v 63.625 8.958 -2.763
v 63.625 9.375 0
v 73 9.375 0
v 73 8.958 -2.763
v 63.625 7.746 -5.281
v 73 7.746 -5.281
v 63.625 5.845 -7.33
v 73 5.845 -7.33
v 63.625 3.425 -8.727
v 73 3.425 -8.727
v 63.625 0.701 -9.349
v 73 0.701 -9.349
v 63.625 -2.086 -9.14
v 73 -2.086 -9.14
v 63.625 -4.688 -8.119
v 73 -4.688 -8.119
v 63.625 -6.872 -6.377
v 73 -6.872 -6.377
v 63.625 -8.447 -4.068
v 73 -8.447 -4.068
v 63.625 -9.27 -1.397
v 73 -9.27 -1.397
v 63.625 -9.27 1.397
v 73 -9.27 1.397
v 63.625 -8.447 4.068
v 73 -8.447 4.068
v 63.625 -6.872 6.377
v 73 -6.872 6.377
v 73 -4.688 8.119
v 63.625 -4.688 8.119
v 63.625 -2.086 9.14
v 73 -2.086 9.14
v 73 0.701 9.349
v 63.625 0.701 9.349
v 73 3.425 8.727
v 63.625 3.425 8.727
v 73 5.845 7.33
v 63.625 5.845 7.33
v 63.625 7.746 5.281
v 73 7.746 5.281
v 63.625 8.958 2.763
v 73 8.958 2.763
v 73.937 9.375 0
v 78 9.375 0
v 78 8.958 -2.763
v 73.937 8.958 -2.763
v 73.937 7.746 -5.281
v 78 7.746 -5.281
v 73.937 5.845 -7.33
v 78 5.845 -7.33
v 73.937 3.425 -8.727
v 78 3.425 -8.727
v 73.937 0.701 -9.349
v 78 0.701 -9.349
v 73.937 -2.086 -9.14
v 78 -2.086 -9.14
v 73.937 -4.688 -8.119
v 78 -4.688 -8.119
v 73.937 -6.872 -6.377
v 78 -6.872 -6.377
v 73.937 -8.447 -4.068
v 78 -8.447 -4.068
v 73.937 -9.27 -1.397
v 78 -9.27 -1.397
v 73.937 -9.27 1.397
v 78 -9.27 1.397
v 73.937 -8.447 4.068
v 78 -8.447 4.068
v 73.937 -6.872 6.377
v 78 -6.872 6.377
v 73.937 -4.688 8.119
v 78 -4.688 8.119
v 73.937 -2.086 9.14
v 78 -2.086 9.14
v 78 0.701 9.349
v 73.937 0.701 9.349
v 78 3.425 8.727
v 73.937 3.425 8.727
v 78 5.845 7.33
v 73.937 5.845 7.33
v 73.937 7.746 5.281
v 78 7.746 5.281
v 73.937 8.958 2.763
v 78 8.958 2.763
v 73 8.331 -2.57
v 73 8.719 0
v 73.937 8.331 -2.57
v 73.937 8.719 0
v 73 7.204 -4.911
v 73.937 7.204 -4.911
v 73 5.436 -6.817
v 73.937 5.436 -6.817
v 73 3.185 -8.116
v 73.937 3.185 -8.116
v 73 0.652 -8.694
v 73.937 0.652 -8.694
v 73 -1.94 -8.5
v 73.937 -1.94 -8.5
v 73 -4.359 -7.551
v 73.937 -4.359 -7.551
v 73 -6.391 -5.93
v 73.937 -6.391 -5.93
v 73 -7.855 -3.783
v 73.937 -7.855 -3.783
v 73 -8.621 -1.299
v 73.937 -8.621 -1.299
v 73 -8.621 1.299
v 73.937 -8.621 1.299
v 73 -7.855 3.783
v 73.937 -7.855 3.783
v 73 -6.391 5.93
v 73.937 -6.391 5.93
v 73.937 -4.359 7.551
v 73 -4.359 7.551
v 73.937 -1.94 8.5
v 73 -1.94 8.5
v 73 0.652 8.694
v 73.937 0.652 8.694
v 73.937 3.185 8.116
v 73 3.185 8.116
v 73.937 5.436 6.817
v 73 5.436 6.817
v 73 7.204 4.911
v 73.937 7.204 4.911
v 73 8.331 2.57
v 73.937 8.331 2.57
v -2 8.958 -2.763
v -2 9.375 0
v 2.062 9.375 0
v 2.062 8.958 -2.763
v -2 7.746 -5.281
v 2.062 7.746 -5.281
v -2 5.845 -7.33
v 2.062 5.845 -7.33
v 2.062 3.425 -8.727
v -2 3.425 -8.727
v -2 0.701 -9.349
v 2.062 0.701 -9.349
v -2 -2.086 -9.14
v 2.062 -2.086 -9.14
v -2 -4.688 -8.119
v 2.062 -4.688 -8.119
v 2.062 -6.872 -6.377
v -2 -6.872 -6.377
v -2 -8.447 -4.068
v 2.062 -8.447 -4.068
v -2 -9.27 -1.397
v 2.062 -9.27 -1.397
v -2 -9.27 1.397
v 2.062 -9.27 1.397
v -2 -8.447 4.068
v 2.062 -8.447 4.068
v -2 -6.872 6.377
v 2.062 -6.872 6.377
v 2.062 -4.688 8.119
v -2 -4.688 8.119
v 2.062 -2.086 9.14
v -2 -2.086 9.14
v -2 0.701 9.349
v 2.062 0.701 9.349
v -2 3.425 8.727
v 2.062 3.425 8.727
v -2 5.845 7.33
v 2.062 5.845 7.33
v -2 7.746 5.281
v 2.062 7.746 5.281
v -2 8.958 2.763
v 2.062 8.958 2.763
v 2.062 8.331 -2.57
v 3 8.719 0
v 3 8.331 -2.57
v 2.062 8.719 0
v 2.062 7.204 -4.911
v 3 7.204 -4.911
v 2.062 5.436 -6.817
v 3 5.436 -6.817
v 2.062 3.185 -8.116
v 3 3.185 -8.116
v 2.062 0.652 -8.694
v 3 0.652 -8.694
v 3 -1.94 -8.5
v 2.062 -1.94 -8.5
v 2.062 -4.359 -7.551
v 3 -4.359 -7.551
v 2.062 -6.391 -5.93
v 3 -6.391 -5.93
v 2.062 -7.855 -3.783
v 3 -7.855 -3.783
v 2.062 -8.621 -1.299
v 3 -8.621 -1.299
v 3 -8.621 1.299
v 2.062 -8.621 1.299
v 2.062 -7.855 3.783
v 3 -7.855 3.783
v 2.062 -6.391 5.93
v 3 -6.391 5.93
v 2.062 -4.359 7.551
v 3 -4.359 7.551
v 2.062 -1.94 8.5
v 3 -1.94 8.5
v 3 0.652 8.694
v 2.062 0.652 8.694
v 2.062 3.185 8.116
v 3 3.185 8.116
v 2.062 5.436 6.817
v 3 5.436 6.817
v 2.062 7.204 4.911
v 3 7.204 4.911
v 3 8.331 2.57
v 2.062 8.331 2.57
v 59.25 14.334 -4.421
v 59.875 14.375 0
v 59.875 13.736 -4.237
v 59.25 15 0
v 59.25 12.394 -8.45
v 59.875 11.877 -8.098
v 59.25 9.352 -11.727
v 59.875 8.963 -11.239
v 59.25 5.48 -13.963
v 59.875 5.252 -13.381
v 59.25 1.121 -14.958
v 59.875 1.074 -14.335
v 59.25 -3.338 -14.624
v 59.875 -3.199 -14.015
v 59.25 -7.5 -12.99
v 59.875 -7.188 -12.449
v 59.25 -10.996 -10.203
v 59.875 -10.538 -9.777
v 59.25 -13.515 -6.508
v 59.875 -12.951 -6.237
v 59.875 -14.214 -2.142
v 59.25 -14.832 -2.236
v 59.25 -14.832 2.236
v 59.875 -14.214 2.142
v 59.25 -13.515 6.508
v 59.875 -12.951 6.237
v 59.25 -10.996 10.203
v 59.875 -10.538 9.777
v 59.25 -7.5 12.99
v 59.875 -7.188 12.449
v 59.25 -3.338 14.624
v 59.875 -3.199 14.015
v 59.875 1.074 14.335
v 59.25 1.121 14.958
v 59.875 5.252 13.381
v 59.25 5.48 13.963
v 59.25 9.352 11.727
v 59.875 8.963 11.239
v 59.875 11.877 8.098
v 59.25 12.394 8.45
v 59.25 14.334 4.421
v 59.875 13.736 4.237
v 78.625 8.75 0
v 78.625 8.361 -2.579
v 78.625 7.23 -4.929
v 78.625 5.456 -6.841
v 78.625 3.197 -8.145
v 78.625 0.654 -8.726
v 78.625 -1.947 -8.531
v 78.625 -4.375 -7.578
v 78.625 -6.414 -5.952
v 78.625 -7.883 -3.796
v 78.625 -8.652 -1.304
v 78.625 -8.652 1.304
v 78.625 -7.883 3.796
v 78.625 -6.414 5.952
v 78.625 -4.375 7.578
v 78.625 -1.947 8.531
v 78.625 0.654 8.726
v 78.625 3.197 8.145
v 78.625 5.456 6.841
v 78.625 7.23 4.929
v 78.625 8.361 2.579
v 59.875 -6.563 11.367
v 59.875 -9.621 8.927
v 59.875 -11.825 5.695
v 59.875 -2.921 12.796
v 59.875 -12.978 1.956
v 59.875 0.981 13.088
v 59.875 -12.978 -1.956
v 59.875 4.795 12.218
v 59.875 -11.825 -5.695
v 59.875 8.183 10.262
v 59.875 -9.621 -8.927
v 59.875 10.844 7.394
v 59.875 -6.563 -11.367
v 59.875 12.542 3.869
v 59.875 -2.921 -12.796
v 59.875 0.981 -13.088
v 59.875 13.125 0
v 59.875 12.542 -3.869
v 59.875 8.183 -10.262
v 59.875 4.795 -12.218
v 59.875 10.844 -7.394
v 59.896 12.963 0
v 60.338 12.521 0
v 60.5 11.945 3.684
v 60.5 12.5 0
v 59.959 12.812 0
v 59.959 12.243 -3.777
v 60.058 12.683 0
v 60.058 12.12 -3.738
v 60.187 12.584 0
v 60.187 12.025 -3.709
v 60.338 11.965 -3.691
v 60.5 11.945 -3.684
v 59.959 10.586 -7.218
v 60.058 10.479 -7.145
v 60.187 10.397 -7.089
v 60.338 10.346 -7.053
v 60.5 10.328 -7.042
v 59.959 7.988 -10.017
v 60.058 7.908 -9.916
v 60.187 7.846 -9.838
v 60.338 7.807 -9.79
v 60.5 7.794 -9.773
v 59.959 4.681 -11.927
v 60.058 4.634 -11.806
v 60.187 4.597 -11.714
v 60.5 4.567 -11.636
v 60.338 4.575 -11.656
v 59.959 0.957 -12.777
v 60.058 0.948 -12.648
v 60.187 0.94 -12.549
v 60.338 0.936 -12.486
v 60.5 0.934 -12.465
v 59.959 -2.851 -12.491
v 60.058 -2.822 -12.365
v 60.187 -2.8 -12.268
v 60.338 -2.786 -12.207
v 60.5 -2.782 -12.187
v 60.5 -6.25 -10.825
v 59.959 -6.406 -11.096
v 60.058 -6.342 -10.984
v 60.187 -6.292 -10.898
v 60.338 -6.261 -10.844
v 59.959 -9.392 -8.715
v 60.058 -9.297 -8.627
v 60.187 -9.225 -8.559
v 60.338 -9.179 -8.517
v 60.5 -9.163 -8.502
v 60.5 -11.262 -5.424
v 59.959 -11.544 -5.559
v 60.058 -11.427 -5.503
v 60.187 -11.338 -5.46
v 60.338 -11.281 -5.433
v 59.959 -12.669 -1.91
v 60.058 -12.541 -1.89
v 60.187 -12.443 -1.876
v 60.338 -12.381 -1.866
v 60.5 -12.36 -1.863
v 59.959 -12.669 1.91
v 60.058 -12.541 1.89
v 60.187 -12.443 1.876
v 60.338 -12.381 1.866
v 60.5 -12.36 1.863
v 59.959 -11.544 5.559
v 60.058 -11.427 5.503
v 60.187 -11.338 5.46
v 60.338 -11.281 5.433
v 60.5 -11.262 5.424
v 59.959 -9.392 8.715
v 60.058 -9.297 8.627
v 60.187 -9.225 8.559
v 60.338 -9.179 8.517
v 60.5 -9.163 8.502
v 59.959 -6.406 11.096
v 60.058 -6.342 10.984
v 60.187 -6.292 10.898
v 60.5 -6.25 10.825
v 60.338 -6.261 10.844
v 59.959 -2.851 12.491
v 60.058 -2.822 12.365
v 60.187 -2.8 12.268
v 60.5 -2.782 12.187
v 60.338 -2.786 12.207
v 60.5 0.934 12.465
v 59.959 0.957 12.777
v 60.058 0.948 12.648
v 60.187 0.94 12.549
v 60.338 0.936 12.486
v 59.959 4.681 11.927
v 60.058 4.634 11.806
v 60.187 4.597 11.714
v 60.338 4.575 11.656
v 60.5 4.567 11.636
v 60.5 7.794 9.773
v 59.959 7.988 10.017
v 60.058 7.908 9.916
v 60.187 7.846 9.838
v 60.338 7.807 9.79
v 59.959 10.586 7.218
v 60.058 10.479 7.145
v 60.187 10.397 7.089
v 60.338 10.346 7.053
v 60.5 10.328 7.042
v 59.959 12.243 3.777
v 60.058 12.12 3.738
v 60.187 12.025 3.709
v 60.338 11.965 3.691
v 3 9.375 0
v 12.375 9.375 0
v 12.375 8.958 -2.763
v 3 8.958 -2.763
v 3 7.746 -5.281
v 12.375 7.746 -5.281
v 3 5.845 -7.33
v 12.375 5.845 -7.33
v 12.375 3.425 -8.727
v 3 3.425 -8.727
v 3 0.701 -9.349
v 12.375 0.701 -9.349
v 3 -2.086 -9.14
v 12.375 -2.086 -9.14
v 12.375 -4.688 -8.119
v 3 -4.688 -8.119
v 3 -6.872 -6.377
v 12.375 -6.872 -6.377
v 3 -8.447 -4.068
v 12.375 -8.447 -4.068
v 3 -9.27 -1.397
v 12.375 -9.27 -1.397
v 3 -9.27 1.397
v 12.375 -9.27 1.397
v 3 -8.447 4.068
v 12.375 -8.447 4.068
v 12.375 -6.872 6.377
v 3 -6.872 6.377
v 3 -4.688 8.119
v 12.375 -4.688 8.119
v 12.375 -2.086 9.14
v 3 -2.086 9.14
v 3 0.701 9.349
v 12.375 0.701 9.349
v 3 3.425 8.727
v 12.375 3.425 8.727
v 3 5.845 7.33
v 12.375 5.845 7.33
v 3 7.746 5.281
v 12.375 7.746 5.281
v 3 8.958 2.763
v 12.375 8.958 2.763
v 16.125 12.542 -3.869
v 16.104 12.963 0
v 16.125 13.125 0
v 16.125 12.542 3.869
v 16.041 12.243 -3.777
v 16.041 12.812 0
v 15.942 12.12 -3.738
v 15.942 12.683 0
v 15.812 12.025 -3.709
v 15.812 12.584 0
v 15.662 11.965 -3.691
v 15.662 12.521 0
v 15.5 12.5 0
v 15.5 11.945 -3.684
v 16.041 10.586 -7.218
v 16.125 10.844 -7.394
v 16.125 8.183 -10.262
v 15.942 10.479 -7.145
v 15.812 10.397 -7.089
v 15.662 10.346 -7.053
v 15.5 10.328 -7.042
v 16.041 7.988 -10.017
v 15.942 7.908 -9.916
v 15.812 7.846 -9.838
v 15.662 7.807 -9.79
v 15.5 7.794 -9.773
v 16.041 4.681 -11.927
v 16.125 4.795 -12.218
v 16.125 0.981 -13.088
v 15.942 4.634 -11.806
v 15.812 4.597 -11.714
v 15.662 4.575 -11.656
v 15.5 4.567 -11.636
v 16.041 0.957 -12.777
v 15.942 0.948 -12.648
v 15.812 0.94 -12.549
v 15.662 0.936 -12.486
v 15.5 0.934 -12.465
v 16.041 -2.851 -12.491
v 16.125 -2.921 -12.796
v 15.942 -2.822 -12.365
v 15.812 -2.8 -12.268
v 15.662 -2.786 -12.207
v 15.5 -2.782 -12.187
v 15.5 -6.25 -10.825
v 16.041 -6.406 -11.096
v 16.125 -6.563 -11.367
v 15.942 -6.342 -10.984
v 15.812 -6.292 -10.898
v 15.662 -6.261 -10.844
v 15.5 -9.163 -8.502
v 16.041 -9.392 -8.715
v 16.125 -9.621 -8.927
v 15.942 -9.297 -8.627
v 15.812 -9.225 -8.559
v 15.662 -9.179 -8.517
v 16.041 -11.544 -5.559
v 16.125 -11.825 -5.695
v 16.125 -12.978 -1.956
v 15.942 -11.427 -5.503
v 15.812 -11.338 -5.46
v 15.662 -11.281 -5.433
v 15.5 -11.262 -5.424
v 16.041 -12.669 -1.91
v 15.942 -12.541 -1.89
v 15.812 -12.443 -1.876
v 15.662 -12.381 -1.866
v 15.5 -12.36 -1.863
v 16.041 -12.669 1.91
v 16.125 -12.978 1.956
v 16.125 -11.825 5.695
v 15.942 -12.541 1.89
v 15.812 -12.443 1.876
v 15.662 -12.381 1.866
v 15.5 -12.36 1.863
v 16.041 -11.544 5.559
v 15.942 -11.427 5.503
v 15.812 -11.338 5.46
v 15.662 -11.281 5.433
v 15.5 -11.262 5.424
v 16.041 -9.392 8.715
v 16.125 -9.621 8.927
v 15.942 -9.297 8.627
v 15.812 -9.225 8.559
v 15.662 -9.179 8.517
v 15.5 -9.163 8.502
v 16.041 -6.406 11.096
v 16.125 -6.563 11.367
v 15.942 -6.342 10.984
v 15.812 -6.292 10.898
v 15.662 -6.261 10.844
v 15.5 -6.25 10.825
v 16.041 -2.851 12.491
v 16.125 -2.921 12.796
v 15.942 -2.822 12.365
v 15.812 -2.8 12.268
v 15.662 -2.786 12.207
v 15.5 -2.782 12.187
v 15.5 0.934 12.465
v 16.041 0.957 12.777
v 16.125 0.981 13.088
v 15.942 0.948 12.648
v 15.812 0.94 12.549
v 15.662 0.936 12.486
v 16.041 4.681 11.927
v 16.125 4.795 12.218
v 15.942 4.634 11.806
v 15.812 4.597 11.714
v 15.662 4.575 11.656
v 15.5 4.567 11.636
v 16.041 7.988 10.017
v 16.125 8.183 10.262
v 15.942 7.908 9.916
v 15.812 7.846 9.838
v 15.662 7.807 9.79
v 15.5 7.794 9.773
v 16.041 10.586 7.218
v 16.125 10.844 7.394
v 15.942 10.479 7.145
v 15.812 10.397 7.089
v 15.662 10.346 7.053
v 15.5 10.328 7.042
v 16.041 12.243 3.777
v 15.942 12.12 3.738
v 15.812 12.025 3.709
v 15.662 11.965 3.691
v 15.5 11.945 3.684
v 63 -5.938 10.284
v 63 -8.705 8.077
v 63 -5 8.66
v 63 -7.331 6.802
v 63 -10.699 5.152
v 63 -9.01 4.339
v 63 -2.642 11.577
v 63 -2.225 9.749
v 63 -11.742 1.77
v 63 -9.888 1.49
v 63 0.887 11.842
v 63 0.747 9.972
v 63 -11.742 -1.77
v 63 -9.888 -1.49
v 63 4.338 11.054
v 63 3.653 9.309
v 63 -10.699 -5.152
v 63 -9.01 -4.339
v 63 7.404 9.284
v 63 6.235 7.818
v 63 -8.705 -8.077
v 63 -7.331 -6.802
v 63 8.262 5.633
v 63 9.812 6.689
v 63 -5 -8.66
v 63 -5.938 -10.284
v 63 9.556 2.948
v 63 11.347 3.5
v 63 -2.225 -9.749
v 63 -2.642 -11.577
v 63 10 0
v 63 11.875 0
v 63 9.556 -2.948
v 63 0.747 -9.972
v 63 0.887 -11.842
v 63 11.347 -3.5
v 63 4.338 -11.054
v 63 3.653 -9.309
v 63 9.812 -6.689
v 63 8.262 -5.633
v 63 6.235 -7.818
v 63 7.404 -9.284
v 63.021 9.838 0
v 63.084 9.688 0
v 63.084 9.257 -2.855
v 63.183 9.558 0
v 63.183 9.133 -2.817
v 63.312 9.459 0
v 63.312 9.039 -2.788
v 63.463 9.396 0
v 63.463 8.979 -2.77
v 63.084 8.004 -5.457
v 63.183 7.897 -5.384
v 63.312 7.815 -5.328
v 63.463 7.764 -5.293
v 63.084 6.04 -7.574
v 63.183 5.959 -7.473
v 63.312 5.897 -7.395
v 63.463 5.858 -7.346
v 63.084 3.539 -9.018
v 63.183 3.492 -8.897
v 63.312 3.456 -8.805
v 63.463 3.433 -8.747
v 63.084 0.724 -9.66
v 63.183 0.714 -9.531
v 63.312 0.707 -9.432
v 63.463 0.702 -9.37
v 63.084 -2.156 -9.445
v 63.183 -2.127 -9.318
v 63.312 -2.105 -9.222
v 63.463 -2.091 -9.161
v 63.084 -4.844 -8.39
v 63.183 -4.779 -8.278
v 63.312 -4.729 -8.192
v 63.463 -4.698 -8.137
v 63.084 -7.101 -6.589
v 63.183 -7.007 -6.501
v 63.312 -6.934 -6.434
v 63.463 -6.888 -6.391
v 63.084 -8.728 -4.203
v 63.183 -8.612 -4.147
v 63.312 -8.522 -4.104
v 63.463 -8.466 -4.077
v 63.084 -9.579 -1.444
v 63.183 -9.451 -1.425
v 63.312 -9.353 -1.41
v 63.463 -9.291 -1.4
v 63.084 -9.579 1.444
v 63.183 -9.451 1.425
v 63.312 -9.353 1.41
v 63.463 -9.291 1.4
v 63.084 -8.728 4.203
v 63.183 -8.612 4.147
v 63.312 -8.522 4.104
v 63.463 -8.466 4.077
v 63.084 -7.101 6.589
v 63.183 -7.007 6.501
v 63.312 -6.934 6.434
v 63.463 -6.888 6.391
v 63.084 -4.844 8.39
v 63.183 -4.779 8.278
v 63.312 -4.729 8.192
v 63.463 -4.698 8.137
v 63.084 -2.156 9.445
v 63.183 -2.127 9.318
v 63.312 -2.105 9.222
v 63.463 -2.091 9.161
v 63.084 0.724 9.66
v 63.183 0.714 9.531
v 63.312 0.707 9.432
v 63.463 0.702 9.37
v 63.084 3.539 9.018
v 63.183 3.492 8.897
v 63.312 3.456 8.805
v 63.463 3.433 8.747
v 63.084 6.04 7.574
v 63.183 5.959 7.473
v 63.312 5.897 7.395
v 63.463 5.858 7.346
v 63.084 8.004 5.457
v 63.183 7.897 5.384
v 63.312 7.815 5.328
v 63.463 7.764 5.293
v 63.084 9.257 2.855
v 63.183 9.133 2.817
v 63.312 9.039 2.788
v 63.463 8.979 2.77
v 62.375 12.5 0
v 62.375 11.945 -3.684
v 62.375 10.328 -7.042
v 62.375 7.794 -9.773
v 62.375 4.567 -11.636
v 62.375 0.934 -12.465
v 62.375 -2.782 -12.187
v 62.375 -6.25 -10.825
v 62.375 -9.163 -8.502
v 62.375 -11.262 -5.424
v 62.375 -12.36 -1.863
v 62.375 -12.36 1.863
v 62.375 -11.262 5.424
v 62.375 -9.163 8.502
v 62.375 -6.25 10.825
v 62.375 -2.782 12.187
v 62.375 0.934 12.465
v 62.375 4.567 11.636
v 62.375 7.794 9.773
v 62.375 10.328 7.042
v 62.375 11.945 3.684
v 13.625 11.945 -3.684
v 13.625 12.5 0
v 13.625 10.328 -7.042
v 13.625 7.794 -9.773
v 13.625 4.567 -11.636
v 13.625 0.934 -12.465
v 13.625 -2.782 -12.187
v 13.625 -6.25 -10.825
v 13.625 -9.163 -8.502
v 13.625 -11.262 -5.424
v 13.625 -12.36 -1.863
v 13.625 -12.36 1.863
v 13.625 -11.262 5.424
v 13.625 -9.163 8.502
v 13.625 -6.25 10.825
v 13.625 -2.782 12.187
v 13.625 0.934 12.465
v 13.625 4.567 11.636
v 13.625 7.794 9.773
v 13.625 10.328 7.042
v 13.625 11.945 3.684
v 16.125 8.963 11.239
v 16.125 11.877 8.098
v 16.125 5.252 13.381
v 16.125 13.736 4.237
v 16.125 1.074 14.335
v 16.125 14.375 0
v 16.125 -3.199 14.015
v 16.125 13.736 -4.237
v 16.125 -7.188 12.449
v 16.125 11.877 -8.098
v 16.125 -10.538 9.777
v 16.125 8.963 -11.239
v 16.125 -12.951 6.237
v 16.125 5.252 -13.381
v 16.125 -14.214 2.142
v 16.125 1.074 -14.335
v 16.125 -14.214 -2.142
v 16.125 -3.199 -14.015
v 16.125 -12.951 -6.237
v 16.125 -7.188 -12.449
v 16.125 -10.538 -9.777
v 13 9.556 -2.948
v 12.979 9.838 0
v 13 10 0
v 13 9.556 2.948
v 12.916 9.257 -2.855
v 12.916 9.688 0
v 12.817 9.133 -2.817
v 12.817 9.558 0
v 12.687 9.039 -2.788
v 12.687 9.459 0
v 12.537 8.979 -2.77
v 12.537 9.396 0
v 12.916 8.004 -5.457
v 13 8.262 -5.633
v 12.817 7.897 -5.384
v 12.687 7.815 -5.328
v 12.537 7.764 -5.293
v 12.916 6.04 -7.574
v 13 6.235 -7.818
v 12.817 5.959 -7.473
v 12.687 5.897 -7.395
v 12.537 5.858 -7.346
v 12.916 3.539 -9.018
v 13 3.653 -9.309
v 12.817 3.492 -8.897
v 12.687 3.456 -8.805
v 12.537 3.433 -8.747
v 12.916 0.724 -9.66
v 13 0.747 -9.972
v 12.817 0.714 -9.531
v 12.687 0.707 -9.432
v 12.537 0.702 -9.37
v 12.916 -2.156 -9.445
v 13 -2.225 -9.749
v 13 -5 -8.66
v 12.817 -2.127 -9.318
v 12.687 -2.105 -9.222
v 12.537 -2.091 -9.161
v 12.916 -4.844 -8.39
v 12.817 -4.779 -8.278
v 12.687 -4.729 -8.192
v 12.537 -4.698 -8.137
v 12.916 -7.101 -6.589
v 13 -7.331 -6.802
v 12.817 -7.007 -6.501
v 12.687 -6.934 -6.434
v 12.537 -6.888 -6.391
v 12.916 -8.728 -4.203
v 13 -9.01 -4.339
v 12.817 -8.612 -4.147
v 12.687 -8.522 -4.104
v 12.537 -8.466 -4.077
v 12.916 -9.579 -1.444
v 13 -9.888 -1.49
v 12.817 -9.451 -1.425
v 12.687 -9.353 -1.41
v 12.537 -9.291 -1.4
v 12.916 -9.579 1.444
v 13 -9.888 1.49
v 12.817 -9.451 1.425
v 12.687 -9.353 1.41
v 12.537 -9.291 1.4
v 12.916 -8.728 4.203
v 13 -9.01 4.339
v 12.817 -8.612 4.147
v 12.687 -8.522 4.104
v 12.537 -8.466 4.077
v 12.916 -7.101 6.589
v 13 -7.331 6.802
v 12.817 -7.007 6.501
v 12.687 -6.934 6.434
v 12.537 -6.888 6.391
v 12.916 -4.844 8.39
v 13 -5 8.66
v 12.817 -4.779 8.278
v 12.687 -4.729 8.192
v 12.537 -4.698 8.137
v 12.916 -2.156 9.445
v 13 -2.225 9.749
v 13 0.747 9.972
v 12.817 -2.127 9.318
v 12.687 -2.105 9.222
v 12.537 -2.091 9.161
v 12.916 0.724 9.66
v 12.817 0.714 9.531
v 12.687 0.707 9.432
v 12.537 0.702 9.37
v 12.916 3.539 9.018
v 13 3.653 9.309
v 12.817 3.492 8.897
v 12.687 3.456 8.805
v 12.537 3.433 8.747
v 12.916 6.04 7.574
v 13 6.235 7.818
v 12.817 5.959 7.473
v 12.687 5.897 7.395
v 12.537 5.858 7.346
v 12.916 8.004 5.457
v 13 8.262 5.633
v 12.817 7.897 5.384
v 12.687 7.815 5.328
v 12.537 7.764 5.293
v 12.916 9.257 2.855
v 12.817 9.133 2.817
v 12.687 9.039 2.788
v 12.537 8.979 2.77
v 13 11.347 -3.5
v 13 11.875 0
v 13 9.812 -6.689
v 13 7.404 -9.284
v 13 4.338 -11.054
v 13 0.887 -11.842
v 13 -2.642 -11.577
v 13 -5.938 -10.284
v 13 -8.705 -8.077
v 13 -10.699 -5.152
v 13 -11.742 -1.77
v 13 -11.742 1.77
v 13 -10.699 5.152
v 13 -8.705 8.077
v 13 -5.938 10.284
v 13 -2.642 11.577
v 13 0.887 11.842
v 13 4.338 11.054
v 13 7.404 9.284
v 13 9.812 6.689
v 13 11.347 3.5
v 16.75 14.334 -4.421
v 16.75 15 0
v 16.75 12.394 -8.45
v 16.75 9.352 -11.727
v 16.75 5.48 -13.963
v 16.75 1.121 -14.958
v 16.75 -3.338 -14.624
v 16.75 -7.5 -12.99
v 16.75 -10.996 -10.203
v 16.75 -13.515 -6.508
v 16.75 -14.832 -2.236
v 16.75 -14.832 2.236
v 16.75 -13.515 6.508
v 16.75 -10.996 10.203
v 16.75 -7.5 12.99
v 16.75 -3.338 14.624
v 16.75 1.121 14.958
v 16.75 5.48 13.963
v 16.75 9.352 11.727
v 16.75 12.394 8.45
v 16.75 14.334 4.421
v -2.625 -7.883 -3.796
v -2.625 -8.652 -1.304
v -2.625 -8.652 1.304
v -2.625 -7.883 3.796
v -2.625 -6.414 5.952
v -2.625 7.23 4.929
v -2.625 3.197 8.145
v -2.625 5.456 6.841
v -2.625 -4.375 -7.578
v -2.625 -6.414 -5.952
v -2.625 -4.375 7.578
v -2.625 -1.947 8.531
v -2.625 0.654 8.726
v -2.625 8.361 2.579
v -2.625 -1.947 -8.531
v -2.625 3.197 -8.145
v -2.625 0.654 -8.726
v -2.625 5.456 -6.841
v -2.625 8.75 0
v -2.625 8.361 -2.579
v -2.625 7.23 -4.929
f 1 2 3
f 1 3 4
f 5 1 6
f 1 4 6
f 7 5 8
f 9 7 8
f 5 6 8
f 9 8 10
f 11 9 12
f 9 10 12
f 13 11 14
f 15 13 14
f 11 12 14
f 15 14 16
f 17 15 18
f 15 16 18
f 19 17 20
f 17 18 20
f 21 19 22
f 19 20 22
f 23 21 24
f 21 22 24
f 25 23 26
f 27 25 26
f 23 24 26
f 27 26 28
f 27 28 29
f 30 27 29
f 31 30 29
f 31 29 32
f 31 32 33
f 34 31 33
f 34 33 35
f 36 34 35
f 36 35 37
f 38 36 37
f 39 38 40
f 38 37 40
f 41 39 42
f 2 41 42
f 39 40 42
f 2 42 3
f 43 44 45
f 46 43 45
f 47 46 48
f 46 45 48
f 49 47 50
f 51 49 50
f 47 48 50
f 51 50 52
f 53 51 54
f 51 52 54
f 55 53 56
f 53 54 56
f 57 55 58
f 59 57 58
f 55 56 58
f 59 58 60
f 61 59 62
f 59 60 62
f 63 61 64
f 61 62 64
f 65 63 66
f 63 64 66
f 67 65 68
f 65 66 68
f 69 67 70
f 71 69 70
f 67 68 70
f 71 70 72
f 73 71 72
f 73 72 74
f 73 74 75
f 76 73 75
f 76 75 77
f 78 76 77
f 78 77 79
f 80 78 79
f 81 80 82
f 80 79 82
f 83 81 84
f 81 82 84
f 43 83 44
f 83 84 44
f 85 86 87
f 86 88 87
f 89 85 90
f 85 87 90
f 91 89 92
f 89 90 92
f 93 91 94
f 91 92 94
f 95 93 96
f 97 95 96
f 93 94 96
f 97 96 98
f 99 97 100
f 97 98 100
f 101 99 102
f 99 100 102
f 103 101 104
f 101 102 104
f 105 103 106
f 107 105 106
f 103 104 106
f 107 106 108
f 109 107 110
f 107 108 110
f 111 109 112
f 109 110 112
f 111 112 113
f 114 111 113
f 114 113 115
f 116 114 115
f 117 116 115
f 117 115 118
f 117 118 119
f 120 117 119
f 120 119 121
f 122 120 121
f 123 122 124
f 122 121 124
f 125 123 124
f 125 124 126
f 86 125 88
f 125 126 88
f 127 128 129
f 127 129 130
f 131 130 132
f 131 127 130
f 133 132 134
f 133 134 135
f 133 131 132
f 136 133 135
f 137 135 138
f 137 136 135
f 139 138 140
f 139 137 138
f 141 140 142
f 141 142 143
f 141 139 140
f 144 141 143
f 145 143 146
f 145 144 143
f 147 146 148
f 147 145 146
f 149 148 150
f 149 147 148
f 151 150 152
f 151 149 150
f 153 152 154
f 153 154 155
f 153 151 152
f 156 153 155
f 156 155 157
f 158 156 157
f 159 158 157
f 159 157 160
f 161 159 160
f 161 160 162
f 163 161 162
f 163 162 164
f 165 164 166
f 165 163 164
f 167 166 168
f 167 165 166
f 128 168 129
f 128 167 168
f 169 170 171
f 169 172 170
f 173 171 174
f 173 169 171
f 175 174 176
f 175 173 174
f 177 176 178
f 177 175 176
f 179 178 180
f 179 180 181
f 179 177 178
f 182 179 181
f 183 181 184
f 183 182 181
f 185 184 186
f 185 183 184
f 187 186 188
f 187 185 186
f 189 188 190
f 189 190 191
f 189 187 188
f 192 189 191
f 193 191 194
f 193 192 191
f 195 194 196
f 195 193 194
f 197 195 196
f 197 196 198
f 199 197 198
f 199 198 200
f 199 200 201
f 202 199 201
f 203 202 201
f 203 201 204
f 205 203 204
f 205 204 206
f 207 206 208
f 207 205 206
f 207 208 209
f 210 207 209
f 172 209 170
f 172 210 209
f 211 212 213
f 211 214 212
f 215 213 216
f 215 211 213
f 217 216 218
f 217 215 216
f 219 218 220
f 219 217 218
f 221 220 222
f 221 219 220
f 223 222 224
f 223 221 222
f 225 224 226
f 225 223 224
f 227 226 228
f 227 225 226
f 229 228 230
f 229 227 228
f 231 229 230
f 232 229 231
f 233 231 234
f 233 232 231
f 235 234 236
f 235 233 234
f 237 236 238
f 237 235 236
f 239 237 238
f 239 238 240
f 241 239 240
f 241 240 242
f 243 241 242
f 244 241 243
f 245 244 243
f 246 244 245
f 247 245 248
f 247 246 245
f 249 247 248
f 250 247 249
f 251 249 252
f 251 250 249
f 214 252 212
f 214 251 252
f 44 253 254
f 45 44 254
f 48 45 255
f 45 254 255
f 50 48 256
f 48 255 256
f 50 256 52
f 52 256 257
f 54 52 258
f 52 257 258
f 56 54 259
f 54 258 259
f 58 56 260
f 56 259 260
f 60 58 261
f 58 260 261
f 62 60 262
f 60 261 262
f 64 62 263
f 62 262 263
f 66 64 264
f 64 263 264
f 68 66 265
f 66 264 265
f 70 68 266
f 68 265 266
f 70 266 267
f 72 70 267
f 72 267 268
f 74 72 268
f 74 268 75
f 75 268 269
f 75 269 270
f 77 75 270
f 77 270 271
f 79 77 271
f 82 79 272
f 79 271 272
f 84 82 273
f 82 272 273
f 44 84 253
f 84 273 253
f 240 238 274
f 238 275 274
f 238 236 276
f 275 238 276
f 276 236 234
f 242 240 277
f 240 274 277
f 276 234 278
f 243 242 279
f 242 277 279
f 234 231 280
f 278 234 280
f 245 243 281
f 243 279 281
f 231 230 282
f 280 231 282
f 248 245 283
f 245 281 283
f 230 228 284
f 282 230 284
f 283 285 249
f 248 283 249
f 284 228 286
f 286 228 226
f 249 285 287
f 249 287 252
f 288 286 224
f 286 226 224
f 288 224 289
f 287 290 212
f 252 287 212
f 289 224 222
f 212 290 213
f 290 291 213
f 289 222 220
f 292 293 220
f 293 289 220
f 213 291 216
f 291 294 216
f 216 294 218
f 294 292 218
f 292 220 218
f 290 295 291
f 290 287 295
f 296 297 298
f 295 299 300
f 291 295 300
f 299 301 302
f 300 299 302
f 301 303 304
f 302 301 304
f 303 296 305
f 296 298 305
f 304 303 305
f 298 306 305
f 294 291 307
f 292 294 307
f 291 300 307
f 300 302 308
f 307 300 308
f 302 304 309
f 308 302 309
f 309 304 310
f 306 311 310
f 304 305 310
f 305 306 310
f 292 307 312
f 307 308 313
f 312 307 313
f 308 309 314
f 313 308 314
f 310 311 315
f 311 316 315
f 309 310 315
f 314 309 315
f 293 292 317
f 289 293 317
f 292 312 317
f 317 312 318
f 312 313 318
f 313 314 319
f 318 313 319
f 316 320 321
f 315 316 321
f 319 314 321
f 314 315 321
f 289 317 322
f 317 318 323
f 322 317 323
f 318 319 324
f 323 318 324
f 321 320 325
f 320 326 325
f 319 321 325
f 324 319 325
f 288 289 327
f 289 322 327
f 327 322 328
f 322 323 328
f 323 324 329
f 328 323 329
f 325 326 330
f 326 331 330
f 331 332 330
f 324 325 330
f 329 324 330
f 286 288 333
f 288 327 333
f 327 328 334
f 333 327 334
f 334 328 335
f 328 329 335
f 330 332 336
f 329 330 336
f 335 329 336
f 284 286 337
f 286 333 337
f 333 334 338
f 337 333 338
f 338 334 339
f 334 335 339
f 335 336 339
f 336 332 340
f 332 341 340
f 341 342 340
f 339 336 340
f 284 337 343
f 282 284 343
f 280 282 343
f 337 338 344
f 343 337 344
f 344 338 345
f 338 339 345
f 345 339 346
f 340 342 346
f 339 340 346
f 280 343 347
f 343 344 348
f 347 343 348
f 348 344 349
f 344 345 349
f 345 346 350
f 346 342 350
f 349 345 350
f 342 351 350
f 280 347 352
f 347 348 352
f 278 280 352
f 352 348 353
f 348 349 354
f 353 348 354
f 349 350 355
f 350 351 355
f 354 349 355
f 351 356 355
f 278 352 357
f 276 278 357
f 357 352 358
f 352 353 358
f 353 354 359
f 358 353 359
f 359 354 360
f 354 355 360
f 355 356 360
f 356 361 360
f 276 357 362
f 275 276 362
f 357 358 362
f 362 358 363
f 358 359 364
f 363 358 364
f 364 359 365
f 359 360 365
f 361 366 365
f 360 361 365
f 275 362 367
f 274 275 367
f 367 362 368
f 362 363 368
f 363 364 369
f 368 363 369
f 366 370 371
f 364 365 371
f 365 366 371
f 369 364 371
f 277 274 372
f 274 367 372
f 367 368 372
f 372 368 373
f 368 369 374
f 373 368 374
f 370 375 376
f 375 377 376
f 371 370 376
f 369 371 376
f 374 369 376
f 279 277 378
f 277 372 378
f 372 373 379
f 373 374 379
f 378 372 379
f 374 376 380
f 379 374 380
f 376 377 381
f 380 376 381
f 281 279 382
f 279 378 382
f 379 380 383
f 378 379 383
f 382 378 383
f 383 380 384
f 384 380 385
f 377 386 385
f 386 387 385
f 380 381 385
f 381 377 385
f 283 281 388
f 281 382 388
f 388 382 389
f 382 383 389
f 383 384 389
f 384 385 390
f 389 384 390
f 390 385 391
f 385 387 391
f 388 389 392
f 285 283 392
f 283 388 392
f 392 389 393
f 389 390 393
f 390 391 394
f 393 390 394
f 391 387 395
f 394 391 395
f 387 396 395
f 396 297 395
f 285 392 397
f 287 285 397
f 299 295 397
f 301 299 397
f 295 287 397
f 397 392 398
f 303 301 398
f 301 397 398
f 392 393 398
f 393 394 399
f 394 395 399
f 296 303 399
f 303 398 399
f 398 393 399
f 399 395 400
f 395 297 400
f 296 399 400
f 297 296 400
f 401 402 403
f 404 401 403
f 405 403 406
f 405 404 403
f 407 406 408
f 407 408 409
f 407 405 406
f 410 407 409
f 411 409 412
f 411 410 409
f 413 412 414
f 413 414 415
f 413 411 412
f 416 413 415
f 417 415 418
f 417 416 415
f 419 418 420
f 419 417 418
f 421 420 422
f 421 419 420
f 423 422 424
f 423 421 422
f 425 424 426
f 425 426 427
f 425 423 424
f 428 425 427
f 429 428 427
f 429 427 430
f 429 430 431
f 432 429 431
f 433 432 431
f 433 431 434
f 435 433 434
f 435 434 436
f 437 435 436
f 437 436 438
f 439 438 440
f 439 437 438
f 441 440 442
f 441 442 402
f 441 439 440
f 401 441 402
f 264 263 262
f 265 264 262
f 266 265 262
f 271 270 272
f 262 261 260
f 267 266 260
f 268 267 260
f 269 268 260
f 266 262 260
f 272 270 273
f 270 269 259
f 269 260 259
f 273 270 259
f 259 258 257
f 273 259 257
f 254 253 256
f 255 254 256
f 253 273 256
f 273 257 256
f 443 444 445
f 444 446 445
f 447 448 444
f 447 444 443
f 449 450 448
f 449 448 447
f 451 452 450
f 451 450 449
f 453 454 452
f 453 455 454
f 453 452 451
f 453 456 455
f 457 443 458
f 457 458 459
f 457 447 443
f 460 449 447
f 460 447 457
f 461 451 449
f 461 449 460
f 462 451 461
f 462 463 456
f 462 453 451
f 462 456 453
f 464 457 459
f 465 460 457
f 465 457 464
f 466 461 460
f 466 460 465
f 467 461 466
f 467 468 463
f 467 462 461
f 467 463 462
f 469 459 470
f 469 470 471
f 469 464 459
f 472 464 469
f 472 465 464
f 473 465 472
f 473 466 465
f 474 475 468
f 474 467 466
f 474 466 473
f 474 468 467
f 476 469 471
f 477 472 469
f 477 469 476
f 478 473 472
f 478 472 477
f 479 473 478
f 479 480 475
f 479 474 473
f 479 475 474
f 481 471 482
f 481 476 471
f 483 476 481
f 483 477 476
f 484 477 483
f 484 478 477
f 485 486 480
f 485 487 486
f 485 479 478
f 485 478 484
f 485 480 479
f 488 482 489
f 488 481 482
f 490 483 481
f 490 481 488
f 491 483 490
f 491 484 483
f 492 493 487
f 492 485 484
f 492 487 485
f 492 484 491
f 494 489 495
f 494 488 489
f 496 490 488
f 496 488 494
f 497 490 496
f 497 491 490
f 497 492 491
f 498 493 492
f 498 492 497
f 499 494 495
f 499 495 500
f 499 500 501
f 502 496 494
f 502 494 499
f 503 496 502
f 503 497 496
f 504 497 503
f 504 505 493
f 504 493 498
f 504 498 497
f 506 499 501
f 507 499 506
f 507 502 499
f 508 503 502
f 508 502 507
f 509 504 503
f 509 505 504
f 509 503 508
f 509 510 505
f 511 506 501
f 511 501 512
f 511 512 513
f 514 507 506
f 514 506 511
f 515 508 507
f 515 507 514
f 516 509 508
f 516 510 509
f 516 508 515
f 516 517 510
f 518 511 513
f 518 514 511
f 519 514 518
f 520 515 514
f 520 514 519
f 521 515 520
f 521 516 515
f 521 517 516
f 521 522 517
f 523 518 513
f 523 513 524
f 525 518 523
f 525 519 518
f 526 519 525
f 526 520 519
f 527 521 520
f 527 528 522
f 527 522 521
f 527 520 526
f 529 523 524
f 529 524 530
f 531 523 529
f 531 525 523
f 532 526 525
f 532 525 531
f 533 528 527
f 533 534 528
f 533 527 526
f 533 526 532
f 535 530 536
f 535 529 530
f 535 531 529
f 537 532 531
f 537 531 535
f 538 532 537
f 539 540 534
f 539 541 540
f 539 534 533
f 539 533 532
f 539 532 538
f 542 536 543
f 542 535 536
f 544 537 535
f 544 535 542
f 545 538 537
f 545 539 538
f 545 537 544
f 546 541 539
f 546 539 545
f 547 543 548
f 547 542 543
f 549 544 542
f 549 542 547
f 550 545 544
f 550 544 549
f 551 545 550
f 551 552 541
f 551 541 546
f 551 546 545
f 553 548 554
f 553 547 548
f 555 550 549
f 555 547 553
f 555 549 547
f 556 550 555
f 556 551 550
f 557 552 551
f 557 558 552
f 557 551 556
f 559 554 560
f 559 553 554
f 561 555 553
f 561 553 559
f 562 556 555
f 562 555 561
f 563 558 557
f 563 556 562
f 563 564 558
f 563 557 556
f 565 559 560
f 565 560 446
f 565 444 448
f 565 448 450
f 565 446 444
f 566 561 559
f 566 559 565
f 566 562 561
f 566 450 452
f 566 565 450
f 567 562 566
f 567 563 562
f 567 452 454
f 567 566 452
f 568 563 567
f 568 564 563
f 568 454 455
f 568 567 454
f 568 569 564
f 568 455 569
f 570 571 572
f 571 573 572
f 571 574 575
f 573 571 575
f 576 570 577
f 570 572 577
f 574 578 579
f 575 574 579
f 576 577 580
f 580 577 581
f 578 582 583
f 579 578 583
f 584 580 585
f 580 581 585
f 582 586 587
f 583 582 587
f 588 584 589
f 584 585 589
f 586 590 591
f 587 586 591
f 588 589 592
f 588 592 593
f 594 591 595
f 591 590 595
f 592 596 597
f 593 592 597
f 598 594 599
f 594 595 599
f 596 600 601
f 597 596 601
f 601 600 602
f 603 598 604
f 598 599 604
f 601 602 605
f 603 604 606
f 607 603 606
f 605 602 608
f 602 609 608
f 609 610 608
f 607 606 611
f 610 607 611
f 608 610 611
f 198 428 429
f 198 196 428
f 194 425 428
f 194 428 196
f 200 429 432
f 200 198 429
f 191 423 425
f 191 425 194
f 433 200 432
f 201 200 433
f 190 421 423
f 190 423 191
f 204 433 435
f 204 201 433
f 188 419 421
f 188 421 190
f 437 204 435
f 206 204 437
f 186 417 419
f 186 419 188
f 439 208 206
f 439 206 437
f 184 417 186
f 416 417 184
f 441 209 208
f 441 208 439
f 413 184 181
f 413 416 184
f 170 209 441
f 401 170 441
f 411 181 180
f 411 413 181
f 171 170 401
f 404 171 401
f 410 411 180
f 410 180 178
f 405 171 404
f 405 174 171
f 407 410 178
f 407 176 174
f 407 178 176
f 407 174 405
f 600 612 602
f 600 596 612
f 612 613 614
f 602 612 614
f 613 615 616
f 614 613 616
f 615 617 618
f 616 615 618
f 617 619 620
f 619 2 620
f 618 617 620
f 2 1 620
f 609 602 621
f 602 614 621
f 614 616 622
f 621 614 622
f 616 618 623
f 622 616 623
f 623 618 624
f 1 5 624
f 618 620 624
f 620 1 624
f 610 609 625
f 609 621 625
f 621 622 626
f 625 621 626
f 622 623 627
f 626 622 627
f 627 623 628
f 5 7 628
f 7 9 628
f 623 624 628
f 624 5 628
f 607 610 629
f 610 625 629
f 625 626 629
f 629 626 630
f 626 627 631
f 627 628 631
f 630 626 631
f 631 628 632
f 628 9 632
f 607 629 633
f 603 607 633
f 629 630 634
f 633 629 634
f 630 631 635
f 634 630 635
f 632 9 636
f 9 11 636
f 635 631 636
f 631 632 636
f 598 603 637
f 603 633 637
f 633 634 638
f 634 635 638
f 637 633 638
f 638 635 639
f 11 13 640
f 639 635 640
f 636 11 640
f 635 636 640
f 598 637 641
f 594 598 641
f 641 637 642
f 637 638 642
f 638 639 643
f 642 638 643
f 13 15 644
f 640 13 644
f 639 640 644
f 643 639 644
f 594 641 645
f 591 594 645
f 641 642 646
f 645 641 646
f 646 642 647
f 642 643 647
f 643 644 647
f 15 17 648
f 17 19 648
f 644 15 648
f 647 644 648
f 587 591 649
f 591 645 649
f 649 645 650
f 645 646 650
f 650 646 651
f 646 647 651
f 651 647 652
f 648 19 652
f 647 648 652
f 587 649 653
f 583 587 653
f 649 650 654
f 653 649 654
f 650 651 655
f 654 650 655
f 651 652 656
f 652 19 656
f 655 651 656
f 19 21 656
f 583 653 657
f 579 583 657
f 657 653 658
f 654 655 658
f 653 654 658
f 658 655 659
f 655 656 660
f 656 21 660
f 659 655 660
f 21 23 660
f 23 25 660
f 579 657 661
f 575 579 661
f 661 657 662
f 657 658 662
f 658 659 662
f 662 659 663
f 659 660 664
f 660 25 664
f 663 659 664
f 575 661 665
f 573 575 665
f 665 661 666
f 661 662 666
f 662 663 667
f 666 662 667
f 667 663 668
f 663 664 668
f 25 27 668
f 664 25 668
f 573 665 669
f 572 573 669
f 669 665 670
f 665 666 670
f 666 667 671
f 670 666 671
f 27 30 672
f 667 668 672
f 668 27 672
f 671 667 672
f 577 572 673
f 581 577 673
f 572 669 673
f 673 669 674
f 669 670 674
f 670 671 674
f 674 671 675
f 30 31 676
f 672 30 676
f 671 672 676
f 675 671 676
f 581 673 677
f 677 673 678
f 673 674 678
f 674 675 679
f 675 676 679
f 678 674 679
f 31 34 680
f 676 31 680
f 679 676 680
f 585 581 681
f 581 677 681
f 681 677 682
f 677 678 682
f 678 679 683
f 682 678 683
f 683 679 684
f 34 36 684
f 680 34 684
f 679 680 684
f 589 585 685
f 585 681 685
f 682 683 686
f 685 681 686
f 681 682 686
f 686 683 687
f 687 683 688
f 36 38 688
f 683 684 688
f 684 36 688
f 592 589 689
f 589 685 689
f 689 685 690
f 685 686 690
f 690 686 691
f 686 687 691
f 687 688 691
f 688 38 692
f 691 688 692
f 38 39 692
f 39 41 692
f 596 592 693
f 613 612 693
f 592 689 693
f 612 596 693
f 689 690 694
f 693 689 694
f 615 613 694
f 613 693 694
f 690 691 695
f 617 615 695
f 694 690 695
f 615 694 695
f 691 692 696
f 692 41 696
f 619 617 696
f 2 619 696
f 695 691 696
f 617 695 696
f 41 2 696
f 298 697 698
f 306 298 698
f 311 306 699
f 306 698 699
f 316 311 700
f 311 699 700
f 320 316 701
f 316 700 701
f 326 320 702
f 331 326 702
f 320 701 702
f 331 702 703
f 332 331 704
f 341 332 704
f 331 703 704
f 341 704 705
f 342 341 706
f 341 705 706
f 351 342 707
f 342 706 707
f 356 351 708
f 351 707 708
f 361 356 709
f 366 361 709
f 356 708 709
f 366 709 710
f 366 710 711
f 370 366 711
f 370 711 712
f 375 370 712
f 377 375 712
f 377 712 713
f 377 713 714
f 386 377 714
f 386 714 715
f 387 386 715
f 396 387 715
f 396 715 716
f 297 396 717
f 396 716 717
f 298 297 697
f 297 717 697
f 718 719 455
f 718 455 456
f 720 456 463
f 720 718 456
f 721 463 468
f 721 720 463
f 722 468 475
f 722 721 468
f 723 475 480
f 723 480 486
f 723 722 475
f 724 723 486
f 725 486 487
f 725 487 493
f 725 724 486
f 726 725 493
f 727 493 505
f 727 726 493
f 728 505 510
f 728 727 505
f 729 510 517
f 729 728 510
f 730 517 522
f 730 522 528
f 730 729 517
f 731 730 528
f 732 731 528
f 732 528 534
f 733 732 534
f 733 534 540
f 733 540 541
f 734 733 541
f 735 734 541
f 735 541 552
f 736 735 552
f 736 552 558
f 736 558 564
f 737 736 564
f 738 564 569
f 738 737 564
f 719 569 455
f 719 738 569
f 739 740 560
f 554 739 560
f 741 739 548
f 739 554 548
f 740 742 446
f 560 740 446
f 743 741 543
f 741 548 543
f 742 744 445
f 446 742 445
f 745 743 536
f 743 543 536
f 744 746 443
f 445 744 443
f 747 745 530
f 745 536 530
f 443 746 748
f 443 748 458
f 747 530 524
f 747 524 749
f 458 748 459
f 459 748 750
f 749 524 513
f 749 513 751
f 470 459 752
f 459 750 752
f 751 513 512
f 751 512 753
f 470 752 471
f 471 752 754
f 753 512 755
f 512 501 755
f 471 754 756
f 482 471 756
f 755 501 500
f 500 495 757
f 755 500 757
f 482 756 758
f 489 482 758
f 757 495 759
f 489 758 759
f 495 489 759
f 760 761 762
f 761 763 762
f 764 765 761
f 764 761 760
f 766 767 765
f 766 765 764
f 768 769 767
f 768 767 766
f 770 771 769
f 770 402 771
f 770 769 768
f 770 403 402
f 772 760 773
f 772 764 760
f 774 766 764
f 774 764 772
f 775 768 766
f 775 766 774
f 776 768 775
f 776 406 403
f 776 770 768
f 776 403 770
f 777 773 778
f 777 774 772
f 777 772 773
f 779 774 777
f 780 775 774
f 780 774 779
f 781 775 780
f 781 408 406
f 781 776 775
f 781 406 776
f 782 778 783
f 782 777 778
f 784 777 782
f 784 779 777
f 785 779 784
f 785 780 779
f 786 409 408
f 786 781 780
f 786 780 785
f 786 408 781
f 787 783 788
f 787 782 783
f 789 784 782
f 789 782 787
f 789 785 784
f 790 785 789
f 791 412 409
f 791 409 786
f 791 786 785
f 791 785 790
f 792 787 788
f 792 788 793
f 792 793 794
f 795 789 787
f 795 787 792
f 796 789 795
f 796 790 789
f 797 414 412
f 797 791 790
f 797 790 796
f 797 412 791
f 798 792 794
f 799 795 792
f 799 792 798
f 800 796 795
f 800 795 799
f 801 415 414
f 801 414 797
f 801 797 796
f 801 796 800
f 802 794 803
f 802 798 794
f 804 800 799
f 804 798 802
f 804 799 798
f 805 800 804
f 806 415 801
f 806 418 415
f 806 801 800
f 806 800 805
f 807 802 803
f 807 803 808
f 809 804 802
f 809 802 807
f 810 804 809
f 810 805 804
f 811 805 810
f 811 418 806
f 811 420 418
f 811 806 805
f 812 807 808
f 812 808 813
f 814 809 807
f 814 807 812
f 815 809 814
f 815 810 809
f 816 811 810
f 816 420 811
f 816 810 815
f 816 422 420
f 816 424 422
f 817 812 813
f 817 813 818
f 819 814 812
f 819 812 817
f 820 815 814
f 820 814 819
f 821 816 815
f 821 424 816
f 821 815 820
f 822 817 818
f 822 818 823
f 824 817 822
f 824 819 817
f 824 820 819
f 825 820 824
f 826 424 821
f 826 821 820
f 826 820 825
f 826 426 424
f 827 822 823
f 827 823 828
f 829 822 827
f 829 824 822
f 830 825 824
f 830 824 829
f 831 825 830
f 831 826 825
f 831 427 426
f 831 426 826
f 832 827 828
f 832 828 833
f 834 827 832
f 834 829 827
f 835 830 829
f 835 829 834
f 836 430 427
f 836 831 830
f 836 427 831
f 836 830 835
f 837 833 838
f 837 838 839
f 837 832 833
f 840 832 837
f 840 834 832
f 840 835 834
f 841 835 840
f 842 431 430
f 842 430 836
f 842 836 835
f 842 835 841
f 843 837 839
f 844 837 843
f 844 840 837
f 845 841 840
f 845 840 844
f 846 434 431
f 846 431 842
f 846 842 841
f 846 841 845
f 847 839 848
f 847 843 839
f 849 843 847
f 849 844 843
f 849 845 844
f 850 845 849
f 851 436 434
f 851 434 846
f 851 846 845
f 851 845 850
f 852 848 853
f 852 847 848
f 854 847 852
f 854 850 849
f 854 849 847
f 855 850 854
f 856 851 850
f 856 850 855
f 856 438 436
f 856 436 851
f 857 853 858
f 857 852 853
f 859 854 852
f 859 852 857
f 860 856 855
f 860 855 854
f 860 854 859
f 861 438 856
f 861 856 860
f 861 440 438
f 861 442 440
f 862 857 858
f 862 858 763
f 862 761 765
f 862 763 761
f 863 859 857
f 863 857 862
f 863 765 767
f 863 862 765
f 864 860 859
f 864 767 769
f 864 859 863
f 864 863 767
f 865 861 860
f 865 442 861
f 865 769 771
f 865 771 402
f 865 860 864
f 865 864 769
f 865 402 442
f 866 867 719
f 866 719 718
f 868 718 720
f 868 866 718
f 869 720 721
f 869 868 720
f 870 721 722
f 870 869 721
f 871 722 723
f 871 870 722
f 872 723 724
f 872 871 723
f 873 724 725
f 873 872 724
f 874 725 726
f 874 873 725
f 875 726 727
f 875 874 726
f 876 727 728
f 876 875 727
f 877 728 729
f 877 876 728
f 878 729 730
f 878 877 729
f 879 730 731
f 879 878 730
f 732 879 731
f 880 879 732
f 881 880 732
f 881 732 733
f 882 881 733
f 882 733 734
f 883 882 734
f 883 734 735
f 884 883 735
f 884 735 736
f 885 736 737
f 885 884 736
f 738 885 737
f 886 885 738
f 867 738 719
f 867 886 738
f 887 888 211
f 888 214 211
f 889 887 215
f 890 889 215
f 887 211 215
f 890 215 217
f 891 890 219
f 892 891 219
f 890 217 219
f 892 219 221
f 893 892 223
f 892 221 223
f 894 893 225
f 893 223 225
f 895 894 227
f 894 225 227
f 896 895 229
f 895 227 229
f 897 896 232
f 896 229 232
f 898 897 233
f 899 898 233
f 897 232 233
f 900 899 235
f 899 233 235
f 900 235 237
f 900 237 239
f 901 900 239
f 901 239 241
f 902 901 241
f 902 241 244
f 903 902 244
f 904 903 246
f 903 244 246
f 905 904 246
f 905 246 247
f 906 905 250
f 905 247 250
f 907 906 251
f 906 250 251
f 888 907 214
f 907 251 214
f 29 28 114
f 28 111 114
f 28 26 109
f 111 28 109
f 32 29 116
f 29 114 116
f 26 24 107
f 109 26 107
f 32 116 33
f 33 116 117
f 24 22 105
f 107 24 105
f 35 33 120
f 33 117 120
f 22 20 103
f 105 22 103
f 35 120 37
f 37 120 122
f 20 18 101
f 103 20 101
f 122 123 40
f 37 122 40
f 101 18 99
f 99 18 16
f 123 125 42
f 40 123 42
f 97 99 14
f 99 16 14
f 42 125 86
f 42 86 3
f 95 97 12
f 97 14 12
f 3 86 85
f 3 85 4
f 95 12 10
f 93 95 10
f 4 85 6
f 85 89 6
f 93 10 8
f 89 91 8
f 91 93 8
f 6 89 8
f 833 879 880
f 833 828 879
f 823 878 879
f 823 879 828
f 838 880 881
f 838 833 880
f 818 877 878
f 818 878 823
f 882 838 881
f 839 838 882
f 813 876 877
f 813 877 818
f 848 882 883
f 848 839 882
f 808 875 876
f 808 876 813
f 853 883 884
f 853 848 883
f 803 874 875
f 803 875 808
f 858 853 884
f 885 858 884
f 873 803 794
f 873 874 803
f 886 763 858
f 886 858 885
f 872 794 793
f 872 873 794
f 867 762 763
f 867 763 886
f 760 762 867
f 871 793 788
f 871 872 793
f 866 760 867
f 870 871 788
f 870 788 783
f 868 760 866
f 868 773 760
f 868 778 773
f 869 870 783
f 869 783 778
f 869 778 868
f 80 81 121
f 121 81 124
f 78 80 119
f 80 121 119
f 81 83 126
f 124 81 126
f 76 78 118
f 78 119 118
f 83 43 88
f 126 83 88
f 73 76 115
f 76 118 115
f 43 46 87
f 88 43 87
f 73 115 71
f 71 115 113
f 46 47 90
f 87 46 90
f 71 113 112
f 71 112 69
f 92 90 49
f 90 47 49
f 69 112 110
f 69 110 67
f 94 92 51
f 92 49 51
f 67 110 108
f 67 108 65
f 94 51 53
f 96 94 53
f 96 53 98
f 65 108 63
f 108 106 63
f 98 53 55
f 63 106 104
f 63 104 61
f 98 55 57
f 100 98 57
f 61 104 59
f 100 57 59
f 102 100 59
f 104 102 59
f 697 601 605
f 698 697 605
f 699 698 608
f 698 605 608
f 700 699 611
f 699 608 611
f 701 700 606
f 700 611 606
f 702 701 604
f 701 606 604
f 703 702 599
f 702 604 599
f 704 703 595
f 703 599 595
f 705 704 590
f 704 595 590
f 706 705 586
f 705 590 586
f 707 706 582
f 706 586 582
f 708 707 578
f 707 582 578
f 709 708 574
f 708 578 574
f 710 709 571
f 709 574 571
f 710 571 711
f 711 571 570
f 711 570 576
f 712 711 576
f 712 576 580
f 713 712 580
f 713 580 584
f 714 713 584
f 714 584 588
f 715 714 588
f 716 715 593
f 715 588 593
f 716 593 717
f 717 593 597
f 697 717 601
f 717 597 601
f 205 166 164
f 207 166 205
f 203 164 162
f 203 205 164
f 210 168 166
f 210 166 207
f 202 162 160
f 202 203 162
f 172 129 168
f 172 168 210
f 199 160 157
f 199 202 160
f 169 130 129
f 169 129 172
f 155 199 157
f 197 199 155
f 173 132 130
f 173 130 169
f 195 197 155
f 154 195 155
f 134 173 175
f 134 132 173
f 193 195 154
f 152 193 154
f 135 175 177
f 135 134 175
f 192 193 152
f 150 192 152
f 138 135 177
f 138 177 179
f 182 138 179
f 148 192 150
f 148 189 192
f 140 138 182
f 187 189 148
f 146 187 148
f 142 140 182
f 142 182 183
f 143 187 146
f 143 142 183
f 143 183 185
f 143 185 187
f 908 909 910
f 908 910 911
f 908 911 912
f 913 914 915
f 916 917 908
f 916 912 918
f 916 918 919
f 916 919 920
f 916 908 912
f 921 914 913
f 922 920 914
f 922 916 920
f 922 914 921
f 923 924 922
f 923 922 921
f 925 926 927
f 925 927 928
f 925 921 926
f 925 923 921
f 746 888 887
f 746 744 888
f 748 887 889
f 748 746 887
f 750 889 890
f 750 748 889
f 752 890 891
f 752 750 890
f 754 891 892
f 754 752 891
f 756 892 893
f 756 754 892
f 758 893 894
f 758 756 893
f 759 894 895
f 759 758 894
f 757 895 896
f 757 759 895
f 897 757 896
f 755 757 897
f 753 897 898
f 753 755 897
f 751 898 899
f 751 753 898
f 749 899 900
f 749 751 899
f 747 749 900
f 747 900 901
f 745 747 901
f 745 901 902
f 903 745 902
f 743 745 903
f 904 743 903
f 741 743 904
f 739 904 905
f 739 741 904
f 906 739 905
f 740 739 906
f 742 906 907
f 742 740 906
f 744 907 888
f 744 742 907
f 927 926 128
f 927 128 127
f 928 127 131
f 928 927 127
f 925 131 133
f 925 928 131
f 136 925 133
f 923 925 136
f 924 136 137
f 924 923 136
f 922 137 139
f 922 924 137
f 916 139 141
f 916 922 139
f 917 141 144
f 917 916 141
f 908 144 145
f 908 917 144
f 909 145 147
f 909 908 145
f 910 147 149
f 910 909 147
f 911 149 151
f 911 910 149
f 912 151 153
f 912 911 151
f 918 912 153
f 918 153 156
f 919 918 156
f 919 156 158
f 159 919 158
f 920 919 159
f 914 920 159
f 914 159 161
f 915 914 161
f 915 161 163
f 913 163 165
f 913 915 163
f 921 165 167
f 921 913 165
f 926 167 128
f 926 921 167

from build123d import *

# Parameters (mm, degrees)
M12_TAPPED_HOLE1_D           = 10.2
M12_TAPPED_HOLE1_DEPTH       = 16.935610843
M12_TAPPED_HOLE1_CSINK_D     = 12.05
M12_TAPPED_HOLE1_CSINK_ANGLE = 90
M12_TAPPED_HOLE1_TIP         = 3.064389157
FILLET1_R                    = 1
CHAMFER1_SIZE                = 1
SCALE1_SCALE                 = 0.625


with BuildPart() as part:
    # Sketch1 → Revolve1 (revolve)
    with BuildSketch(Plane.XY):
        Polygon((0, 0), (0, 24), (70, 24), (70, 20), (75, 20), (75, 15), (91, 15), (91, 13.95), (92.5, 13.95), (92.5, 15), (100, 15), (100, 0), align=None)
    revolve(axis=Axis((100, 0, 0), (-1, 0, 0)))

    # M12 Tapped Hole1
    with Locations(Plane.ZY):
        with Locations((0, 0)):
            CounterSinkHole(M12_TAPPED_HOLE1_D / 2, M12_TAPPED_HOLE1_CSINK_D / 2, depth=M12_TAPPED_HOLE1_DEPTH, counter_sink_angle=M12_TAPPED_HOLE1_CSINK_ANGLE)
            with Locations((0, 0, -(M12_TAPPED_HOLE1_DEPTH + M12_TAPPED_HOLE1_TIP / 2))):  # 118° drill point
                Cone(0, M12_TAPPED_HOLE1_D / 2, M12_TAPPED_HOLE1_TIP, mode=Mode.SUBTRACT)

    # Fillet1
    fillet1_edges = [part.edges().sort_by_distance(p)[0] for p in [
        (75, -15, 0),
        (70, -20, 0),
    ]]
    fillet(fillet1_edges, radius=FILLET1_R)

    # Chamfer1
    chamfer1_edges = [part.edges().sort_by_distance(p)[0] for p in [
        (75, -20, 0),
        (70, -24, 0),
        (0, -24, 0),
        (100, -15, 0),
    ]]
    chamfer(chamfer1_edges, length=CHAMFER1_SIZE)


with BuildPart() as part_1:
    # Scale1: scaled about (42.999626609, 0, 0)
    add(part.part.scale(SCALE1_SCALE).moved(Location((16.124859978, 0, 0))))

    # Mirror2: part across plane


with BuildPart() as part_2:
    add(part_1.part)
    add(part_1.part.mirror(Plane.ZY.offset(-37.999859978)))


solid = part_2.part
